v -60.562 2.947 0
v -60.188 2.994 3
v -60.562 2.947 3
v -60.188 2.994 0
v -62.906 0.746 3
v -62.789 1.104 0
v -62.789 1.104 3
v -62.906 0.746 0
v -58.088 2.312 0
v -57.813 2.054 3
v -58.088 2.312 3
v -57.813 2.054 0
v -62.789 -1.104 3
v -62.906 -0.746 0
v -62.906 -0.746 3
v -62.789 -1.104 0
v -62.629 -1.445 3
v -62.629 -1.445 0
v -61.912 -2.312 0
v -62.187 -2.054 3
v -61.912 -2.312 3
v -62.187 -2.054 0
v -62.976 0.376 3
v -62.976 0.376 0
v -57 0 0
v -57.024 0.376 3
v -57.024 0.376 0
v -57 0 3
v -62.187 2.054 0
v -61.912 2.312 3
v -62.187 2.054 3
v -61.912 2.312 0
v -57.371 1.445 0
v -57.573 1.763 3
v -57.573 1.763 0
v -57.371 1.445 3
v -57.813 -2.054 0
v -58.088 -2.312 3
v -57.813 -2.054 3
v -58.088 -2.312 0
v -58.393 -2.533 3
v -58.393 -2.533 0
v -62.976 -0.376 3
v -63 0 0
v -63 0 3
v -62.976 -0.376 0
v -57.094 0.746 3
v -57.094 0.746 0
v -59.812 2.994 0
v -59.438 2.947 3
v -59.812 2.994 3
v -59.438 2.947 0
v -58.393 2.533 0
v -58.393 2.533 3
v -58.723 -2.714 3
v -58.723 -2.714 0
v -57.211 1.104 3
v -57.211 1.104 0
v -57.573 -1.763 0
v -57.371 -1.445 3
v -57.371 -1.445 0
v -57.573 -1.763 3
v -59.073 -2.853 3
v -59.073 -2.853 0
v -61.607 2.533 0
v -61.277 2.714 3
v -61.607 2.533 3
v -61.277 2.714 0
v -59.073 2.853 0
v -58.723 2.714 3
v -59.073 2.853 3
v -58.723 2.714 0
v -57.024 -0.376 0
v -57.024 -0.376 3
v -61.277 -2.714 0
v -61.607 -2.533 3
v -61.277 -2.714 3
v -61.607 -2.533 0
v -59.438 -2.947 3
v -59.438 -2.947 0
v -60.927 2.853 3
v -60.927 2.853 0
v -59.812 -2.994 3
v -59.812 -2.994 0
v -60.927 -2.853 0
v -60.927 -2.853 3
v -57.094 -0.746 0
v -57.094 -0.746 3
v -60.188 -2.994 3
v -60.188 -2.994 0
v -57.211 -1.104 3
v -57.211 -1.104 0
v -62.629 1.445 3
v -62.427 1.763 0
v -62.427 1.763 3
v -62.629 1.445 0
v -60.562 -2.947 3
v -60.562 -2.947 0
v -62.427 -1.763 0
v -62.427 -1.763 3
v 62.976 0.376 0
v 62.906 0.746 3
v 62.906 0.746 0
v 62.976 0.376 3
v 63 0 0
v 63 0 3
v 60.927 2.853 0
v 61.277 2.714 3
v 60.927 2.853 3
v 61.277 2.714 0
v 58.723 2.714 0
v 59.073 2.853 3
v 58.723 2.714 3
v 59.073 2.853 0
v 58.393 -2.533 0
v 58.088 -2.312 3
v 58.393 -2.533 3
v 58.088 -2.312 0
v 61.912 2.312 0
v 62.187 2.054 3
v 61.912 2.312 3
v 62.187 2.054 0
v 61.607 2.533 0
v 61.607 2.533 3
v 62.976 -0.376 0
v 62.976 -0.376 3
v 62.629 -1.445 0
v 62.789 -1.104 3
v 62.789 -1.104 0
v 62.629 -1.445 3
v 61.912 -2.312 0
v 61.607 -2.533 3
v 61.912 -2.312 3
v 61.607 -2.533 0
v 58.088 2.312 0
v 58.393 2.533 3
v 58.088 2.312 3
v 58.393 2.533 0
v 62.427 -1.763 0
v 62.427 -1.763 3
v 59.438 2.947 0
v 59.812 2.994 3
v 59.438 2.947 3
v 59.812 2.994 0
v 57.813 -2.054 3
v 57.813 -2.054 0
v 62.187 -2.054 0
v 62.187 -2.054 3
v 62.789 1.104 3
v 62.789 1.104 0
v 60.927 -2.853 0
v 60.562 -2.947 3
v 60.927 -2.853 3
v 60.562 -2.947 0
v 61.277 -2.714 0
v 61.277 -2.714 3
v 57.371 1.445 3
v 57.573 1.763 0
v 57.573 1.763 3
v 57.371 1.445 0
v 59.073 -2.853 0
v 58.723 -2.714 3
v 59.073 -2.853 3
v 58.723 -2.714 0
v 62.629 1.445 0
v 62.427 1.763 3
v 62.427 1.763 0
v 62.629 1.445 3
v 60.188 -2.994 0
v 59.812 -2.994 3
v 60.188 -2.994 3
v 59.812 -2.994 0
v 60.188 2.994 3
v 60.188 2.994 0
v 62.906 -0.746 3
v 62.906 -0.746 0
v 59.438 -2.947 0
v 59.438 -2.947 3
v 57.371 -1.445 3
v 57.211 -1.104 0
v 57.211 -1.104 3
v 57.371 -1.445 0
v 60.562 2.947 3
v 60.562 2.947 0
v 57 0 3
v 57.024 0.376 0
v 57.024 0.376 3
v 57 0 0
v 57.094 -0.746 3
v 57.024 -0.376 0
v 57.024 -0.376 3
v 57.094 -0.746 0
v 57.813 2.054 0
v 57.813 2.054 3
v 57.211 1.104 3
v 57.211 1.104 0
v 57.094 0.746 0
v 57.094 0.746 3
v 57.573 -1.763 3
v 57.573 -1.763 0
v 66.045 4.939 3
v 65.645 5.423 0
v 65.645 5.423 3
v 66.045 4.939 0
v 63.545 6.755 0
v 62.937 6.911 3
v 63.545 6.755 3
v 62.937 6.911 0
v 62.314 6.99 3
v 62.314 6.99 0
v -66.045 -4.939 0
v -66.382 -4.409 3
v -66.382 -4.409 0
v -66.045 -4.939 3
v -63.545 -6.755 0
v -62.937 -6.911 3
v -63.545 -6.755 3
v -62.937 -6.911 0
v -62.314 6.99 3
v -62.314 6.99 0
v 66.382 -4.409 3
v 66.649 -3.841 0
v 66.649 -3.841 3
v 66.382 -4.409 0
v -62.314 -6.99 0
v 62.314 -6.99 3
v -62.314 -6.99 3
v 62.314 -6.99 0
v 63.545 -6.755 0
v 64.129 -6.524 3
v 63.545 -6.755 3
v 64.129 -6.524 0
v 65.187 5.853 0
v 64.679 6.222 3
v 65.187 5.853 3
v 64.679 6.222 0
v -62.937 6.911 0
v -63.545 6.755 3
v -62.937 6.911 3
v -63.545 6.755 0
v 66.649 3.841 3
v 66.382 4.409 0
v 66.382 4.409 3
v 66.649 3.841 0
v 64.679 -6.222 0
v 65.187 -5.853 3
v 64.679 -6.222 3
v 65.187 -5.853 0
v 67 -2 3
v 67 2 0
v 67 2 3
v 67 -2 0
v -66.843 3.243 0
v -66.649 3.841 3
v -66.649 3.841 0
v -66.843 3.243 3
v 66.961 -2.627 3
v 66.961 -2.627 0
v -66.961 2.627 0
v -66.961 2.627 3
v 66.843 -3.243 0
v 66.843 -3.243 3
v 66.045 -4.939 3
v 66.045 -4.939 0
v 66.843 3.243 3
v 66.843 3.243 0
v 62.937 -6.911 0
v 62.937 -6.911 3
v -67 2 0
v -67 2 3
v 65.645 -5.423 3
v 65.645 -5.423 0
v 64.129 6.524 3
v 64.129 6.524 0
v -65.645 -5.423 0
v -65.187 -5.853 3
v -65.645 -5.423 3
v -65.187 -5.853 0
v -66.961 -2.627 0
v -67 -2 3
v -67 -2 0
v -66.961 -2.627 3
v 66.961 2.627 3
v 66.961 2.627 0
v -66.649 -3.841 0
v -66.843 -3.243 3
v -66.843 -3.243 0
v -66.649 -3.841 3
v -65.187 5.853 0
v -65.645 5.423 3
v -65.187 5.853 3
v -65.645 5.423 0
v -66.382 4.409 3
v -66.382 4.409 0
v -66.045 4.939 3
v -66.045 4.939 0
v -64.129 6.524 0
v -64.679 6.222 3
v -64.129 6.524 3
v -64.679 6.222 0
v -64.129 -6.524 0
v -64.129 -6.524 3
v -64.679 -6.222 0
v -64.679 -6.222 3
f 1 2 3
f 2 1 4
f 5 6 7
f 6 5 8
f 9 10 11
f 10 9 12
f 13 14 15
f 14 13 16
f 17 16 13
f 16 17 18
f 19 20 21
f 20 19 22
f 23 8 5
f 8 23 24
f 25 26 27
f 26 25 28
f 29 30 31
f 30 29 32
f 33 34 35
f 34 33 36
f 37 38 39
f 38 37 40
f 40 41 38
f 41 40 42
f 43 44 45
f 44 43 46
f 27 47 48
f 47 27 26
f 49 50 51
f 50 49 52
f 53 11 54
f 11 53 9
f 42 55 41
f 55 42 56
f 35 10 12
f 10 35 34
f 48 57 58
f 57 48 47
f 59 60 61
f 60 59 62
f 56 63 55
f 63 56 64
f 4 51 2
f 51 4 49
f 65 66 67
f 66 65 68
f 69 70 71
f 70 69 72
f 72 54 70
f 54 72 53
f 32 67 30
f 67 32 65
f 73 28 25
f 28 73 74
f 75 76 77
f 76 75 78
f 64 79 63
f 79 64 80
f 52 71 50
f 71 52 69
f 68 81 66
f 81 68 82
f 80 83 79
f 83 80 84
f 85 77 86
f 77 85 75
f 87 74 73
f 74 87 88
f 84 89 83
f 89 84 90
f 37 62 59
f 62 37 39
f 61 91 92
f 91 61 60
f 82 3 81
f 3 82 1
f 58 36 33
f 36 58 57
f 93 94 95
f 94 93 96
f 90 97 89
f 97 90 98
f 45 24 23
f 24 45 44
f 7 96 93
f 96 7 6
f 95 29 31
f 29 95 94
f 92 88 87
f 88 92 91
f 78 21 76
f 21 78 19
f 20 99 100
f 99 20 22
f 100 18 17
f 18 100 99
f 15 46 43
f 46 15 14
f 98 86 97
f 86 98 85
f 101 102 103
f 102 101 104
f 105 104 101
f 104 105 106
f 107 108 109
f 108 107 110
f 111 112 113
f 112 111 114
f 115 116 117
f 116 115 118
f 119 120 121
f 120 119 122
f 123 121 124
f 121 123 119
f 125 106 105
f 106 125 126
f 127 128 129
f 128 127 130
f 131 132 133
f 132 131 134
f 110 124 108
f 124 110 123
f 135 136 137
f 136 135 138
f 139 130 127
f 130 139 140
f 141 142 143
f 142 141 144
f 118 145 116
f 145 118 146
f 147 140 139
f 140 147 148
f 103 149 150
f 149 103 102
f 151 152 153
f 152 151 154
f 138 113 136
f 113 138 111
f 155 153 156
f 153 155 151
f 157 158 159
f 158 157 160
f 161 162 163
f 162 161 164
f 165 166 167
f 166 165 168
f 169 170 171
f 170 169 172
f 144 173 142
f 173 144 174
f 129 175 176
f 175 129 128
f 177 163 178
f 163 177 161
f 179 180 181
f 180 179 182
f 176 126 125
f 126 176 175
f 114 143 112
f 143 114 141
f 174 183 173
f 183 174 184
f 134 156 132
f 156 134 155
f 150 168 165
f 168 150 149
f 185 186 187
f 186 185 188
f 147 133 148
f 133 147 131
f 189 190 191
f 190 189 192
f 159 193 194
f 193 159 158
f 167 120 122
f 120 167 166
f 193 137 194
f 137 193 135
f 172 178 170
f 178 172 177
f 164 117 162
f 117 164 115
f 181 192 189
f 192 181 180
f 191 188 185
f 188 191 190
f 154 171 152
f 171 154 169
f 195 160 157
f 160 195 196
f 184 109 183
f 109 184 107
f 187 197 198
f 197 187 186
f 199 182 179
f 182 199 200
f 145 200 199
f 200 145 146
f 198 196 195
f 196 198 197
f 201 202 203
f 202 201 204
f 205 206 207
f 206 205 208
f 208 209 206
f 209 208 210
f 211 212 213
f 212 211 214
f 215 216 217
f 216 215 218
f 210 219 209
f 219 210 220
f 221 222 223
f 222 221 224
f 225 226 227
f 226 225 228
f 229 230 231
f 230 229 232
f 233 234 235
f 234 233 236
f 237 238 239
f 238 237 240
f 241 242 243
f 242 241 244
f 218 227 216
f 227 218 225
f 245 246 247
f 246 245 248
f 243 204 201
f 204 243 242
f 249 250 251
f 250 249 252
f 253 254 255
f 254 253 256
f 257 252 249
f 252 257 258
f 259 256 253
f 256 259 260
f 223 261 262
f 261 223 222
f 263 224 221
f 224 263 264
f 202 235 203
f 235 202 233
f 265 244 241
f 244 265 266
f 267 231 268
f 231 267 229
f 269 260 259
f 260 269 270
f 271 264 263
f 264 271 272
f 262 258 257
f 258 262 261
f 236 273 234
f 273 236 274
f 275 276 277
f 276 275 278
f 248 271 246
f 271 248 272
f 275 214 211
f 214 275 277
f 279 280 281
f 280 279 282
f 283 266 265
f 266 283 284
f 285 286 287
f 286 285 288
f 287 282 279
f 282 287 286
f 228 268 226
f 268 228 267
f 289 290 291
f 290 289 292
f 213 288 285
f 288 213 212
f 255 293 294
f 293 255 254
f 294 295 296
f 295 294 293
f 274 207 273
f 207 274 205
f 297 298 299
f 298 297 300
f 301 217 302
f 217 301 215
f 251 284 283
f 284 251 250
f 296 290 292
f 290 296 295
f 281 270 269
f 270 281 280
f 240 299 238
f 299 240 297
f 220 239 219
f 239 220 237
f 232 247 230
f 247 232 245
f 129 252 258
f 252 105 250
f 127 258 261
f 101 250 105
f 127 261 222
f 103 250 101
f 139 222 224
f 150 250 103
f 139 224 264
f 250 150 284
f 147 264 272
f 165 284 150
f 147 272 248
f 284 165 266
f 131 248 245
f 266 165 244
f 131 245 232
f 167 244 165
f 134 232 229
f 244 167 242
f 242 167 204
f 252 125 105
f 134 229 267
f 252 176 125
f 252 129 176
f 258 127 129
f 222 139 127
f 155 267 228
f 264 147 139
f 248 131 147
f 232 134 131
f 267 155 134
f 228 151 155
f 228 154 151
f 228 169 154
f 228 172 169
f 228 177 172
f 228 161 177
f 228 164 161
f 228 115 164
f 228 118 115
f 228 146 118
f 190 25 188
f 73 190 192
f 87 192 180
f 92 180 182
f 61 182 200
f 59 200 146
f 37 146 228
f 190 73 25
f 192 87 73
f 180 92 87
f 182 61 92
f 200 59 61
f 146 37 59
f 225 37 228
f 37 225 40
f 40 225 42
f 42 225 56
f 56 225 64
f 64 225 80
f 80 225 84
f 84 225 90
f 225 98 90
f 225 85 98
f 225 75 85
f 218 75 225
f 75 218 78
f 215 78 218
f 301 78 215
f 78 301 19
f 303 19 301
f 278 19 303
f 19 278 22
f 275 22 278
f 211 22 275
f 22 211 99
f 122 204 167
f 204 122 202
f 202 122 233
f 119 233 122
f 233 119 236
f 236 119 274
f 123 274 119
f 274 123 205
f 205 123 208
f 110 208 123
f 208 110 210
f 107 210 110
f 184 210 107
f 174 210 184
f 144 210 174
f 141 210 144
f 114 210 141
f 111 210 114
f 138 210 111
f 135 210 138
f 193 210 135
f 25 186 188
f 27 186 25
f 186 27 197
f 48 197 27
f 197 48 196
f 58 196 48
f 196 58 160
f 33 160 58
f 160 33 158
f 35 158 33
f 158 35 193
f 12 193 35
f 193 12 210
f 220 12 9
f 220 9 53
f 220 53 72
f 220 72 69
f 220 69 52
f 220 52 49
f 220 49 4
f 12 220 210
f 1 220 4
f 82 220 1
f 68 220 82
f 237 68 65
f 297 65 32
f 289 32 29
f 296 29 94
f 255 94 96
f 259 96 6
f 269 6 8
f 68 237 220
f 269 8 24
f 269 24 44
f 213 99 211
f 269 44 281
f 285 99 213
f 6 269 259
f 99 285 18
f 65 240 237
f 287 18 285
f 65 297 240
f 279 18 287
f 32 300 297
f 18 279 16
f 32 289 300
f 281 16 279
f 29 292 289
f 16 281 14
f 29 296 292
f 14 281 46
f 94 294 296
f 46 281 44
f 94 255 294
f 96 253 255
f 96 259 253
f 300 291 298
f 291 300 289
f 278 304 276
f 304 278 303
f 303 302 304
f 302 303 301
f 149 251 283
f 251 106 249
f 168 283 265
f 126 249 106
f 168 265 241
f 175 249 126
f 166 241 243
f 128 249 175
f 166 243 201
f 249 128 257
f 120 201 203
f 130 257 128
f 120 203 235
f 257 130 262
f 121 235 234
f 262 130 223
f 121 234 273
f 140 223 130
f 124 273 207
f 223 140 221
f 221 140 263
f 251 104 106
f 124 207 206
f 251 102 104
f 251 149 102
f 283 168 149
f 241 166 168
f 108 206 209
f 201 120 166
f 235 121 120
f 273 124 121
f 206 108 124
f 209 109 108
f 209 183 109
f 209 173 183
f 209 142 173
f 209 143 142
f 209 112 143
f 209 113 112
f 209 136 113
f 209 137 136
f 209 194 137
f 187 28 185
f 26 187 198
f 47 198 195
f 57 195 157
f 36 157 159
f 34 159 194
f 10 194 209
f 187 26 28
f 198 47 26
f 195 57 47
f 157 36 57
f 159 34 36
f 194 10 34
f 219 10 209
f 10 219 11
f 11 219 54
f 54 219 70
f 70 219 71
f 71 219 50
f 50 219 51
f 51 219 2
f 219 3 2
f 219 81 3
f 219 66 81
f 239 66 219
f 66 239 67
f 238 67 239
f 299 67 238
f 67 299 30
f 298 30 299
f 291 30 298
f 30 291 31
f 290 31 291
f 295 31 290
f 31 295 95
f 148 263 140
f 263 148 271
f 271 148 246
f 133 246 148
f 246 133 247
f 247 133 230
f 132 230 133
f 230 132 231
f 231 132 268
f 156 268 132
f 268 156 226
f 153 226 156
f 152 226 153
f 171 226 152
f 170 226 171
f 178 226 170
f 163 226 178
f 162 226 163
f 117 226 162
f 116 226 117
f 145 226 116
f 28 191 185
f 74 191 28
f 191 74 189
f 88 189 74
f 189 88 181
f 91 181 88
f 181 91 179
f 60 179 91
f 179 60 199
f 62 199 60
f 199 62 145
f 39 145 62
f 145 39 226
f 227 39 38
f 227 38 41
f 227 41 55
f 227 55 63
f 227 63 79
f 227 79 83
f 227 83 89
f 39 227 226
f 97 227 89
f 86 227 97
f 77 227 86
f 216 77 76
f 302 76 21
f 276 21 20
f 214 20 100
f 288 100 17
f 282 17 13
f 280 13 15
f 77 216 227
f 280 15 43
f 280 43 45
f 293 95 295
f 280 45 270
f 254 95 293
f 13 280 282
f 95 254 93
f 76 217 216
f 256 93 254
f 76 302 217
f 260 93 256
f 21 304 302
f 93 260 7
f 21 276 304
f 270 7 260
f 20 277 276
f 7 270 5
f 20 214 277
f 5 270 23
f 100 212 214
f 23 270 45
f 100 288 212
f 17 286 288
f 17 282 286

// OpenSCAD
$fn = 50;


difference() {
	union() {
		hull() {
			translate(v = [-62.0000000000, 2.0000000000, 0]) {
				cylinder(h = 3, r = 5);
			}
			translate(v = [62.0000000000, 2.0000000000, 0]) {
				cylinder(h = 3, r = 5);
			}
			translate(v = [-62.0000000000, -2.0000000000, 0]) {
				cylinder(h = 3, r = 5);
			}
			translate(v = [62.0000000000, -2.0000000000, 0]) {
				cylinder(h = 3, r = 5);
			}
		}
	}
	union() {
		translate(v = [-60.0000000000, 0.0000000000, -100.0000000000]) {
			cylinder(h = 200, r = 3.0000000000);
		}
		translate(v = [-60.0000000000, 0.0000000000, -100.0000000000]) {
			cylinder(h = 200, r = 3.0000000000);
		}
		translate(v = [60.0000000000, 0.0000000000, -100.0000000000]) {
			cylinder(h = 200, r = 3.0000000000);
		}
		translate(v = [60.0000000000, 0.0000000000, -100.0000000000]) {
			cylinder(h = 200, r = 3.0000000000);
		}
	}
}
